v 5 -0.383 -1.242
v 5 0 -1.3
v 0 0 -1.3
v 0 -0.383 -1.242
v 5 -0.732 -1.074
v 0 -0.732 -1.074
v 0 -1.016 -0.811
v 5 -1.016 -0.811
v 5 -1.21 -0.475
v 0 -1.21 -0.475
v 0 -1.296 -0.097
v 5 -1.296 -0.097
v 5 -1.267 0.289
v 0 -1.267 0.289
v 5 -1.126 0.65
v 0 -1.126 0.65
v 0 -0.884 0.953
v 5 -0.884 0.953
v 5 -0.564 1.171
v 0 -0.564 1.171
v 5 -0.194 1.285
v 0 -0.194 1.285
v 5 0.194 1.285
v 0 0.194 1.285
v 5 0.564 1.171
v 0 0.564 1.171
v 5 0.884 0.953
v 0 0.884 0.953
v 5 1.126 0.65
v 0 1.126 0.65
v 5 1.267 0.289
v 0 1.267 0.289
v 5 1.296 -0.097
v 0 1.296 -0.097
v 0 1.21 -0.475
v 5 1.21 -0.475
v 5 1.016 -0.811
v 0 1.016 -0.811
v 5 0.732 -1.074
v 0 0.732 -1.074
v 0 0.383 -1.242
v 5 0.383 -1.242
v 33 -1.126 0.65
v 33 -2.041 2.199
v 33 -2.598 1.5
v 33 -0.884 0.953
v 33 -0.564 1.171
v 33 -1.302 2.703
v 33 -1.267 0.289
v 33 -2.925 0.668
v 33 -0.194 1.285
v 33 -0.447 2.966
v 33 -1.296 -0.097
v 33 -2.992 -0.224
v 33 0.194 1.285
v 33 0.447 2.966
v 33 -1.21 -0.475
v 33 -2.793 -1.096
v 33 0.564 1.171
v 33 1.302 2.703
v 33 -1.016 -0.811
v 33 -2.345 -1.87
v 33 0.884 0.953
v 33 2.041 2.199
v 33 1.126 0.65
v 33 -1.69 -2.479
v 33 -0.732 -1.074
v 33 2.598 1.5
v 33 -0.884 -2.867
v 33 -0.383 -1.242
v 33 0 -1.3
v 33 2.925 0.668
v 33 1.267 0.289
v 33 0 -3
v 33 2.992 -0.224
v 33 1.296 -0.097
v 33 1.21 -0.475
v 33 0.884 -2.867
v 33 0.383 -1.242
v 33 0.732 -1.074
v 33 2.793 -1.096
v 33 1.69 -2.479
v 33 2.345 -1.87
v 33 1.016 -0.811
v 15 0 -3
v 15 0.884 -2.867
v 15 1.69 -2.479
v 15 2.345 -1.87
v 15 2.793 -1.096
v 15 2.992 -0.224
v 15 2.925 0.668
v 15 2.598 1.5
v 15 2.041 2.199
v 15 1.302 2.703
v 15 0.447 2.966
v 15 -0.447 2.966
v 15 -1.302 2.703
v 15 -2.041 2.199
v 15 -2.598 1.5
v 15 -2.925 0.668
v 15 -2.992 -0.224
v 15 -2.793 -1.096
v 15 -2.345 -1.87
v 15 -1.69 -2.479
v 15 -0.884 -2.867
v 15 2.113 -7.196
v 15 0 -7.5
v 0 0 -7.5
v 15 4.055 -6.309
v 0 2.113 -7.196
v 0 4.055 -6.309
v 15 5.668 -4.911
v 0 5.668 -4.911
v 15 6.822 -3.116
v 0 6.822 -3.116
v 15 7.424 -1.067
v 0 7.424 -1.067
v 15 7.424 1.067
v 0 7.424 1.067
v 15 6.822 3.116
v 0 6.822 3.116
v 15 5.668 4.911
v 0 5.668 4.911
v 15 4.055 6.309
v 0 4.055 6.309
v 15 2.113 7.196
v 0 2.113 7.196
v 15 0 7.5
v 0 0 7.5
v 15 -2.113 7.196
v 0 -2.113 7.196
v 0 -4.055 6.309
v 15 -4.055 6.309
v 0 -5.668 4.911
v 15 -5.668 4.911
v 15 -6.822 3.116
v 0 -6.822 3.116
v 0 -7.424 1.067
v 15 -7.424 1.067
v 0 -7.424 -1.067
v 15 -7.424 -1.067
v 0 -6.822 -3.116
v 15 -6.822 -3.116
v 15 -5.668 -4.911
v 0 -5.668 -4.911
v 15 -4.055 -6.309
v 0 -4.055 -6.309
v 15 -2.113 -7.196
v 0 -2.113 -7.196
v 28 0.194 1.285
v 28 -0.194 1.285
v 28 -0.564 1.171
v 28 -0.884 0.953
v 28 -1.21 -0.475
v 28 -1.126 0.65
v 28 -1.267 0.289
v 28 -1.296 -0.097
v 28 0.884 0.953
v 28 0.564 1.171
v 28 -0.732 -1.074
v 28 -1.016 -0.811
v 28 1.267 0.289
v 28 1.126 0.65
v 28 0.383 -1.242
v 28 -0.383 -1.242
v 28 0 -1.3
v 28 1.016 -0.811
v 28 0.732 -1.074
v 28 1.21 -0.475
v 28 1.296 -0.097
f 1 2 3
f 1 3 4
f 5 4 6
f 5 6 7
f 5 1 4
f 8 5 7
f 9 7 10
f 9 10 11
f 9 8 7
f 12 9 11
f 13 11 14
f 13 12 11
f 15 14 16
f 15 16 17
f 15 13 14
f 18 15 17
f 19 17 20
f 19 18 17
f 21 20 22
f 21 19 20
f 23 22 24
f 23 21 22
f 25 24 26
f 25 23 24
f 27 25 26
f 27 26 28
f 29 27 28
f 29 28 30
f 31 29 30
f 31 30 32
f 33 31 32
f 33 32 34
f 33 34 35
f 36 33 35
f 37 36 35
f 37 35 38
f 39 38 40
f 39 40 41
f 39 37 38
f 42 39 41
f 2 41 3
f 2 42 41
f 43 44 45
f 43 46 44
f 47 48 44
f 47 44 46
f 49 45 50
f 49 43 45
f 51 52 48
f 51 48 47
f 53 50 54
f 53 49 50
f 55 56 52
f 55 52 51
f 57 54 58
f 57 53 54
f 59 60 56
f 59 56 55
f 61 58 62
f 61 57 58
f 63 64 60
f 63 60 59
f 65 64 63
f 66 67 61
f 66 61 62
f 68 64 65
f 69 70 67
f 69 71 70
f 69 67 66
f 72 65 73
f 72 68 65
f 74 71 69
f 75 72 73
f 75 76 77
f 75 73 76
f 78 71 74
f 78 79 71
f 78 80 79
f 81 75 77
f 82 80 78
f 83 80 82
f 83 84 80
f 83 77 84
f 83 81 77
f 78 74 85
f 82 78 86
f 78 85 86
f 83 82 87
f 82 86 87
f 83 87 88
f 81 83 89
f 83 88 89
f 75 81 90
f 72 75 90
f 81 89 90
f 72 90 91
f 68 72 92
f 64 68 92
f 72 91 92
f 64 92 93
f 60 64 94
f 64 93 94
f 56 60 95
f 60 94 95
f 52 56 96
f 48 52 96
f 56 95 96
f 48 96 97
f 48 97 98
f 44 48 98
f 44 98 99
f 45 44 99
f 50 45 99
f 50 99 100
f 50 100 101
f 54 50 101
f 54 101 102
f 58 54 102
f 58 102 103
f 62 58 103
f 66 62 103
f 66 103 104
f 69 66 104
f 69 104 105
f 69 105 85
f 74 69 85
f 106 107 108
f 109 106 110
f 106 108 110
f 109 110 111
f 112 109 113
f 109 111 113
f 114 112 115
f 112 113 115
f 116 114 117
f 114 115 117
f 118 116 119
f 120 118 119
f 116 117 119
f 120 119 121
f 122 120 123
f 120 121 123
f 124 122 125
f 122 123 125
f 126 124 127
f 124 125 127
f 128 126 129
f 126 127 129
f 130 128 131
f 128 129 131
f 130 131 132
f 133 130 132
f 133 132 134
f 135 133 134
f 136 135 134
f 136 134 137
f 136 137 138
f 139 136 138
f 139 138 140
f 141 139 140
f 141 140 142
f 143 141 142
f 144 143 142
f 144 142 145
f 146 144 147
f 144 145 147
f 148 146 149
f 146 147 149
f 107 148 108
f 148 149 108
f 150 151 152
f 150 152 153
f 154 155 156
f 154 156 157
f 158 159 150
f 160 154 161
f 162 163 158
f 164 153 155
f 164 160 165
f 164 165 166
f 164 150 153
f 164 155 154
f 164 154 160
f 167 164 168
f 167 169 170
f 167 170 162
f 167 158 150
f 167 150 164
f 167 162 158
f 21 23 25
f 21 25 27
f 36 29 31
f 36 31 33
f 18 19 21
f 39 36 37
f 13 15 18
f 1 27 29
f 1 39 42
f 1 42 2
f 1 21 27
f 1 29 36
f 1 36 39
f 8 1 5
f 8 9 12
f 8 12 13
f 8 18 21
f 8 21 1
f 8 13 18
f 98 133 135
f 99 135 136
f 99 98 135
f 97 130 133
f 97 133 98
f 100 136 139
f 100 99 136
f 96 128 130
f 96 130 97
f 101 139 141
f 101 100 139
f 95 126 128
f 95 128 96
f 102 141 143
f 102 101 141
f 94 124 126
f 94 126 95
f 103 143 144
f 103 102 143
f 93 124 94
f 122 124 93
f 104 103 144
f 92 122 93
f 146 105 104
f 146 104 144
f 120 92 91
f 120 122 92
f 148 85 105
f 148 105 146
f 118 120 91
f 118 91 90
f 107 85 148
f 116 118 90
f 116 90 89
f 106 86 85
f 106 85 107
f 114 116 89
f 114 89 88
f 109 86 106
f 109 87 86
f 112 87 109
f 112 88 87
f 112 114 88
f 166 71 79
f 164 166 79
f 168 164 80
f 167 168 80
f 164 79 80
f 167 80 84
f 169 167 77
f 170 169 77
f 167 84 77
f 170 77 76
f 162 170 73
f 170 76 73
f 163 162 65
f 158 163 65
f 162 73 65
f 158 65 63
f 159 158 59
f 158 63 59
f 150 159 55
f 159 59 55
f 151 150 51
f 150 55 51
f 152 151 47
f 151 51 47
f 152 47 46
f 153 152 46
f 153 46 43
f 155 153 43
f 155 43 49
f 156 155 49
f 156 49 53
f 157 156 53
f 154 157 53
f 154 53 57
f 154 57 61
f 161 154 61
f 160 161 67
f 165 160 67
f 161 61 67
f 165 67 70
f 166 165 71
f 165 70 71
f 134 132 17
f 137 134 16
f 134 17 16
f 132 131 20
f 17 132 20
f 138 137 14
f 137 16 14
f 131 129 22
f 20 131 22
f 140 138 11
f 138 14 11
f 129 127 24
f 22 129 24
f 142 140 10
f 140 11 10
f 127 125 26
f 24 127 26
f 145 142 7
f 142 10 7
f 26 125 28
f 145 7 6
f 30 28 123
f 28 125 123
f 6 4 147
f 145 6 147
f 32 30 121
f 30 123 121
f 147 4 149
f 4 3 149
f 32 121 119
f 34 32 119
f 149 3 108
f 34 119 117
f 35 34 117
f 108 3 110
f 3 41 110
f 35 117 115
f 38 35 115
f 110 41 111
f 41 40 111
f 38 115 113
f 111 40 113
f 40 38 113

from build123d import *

# Parameters (mm, degrees)
SKETCH_1_R          = 3
EXTRUDE_1_DEPTH     = 33
SKETCH_2_R          = 1.3
CUT_EXTRUDE_1_DEPTH = 5
CUT_EXTRUDE_START   = -5
SKETCH_3_R          = 1.3
CUT_EXTRUDE_2_DEPTH = 5
SKETCH_4_R          = 7.5
SKETCH_4_R_2        = 3
EXTRUDE_2_DEPTH     = 15


with BuildPart() as part:
    # ｽｹｯﾁ1 → ﾎﾞｽ - 押し出し1 (new body)
    with BuildSketch(Plane(origin=(0, 0, 0), x_dir=(0, 0, -1), z_dir=(1, 0, 0))):
        Circle(SKETCH_1_R)
    extrude(amount=EXTRUDE_1_DEPTH)

    # ｽｹｯﾁ2 → ｶｯﾄ - 押し出し1 (cut)
    with BuildSketch(Plane(origin=(33, 0, 0), x_dir=(0, 0, -1), z_dir=(1, 0, 0))):
        Circle(SKETCH_2_R)
    extrude(amount=-CUT_EXTRUDE_1_DEPTH, mode=Mode.SUBTRACT)

    # ｽｹｯﾁ3 → ｶｯﾄ - 押し出し2 (cut)
    with BuildSketch(Plane.ZY.offset(CUT_EXTRUDE_START)):
        with Locations(Location((0, 0, 0), (0, 0, 180))):
            Circle(SKETCH_3_R)
    extrude(amount=CUT_EXTRUDE_2_DEPTH, mode=Mode.SUBTRACT)

    # ｽｹｯﾁ4 → ﾎﾞｽ - 押し出し2 (add)
    with BuildSketch(Plane(origin=(0, 0, 0), x_dir=(0, 0, -1), z_dir=(1, 0, 0))):
        Circle(SKETCH_4_R)
        Circle(SKETCH_4_R_2, mode=Mode.SUBTRACT)
    extrude(amount=EXTRUDE_2_DEPTH)


solid = part.part
